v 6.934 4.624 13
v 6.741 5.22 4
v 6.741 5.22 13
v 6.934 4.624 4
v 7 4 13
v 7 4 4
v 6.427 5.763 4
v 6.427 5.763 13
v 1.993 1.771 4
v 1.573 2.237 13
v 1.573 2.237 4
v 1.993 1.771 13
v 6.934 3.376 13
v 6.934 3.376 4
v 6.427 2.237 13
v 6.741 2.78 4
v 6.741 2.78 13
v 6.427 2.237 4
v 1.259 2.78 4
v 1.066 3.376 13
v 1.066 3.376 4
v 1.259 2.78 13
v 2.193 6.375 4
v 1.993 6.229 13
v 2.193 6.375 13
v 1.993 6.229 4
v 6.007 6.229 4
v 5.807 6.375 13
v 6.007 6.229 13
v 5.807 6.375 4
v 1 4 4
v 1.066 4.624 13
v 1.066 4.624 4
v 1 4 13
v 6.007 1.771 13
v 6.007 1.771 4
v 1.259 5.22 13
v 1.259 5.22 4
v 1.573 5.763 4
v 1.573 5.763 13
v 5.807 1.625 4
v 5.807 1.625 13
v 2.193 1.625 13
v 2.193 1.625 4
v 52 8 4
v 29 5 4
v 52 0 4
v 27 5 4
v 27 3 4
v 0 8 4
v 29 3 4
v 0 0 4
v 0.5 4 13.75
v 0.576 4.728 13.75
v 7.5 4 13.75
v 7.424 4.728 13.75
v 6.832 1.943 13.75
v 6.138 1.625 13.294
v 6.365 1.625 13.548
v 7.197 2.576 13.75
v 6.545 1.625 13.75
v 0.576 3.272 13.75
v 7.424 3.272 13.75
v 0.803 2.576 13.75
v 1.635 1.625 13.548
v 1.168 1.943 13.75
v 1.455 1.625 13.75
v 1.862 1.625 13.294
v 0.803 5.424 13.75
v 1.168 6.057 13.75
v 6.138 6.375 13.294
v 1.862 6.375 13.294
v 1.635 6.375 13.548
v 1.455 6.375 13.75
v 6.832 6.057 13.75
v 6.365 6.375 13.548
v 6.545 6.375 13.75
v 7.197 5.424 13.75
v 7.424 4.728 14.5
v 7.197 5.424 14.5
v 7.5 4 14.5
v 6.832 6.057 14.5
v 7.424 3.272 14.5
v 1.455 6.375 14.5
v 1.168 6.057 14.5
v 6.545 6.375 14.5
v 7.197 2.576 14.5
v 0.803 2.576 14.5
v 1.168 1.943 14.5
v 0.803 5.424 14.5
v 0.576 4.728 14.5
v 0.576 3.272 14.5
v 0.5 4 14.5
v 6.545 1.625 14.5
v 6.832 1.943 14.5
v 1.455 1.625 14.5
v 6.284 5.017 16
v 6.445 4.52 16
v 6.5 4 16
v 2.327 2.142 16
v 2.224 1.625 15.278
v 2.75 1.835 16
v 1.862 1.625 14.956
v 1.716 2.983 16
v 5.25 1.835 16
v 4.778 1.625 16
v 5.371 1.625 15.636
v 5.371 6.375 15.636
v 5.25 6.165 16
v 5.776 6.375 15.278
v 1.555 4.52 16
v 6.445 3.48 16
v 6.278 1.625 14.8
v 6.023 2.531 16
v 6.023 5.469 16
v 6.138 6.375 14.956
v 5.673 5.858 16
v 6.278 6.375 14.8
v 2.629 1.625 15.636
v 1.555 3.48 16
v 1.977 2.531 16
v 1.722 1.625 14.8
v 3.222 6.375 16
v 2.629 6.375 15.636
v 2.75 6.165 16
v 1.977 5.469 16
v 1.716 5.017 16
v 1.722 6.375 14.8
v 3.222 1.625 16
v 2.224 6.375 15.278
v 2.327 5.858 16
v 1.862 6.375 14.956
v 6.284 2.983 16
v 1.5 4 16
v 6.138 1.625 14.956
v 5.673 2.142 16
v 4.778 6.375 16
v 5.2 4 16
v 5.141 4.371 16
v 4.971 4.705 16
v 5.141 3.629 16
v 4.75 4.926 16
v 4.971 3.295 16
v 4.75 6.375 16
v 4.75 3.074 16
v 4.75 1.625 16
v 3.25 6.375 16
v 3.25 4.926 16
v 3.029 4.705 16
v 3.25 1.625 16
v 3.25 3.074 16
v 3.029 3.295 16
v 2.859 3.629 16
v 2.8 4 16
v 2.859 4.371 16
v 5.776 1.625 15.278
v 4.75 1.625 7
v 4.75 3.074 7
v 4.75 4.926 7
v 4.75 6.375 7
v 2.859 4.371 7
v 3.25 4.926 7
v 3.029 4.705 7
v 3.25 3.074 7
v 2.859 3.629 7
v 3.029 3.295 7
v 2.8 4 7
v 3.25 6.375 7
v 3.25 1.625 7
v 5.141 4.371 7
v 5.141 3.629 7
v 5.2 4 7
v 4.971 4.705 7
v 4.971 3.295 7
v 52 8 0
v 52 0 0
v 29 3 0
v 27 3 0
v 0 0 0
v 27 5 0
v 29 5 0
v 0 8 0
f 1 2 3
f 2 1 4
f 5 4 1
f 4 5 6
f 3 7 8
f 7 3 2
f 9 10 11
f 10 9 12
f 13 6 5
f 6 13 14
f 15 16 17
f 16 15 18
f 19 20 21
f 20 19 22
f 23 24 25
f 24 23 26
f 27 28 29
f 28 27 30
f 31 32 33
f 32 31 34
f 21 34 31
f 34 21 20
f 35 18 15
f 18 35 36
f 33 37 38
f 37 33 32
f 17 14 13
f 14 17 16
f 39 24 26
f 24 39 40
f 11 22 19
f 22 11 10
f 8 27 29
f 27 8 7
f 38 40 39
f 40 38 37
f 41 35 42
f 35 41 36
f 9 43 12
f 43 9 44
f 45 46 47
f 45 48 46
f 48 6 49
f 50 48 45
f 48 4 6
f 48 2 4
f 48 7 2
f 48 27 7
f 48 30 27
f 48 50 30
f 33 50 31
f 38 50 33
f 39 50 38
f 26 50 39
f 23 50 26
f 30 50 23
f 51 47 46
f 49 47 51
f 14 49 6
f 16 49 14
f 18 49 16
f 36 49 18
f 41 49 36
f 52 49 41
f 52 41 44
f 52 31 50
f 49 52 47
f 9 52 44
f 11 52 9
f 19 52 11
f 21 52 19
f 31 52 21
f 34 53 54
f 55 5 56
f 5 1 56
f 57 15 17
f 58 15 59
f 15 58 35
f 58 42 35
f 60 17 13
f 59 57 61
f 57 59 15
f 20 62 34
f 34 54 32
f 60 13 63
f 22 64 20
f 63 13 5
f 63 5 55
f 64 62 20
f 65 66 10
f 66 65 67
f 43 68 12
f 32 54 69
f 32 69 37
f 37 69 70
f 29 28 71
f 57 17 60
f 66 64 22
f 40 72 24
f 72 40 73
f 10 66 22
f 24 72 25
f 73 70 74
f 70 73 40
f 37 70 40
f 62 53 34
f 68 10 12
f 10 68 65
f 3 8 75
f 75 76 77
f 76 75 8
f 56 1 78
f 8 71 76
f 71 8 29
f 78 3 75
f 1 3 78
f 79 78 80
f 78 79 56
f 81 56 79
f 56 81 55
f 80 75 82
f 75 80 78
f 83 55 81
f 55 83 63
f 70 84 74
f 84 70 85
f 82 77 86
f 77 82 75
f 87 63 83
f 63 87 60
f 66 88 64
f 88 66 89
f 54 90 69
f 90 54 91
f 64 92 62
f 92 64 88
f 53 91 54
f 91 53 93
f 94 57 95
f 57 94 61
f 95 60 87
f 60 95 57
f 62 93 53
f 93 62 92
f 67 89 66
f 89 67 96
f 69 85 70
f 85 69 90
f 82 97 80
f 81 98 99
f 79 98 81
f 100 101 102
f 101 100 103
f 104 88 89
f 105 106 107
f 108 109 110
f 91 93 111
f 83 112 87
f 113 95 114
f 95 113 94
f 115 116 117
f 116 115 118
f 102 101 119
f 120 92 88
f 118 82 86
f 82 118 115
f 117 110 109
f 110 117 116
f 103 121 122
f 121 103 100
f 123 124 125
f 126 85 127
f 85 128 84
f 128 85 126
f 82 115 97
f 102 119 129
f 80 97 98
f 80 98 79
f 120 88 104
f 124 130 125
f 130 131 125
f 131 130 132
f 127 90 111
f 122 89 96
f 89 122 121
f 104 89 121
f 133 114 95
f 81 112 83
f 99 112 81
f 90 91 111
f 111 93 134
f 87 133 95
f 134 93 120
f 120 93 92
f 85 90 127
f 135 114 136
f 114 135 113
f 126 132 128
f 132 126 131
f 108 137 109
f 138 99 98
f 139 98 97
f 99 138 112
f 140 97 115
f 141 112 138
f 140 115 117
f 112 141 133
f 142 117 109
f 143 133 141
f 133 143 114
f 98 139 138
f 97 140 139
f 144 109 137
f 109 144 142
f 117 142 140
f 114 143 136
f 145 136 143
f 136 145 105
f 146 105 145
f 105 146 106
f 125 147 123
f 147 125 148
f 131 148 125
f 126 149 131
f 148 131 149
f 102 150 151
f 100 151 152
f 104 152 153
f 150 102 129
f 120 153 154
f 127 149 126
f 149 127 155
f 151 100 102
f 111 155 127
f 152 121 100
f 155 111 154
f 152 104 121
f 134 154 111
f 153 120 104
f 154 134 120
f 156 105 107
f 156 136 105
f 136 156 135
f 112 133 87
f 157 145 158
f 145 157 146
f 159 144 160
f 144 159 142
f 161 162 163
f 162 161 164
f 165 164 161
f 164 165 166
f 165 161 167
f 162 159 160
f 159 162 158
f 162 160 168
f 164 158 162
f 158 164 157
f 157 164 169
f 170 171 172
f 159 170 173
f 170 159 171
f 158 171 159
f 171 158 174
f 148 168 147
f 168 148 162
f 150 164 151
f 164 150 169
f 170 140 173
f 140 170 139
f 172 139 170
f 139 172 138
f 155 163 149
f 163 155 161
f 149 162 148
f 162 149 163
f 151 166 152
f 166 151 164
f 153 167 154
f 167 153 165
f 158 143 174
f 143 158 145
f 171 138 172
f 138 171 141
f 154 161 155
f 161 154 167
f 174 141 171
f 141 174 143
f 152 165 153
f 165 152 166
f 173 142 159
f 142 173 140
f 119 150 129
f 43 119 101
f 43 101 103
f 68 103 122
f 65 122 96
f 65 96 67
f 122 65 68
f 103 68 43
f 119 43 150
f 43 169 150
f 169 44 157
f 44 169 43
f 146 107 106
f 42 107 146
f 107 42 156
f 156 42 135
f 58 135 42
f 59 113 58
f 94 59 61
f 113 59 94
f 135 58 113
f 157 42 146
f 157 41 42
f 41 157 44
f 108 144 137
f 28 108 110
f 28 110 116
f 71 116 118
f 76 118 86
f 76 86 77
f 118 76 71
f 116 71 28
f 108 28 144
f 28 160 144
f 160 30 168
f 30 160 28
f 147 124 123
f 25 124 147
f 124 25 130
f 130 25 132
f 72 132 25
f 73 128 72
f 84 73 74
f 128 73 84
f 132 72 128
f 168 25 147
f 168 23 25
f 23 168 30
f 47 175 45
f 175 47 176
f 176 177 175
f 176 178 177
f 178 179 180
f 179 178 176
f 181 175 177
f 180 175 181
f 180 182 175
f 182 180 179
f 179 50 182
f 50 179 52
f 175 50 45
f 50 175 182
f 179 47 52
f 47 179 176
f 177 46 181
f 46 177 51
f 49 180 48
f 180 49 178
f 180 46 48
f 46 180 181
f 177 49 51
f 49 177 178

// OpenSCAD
// Pin Connectors V2
// Tony Buser <tbuser@gmail.com>
// From http://www.thingiverse.com/thing:10541

// pinhole(h=5);

tolerance=0.3;

translate([4, 4, 4]) pin(r=3, h=12, t=tolerance, tight=false);
difference() {
cube([52, 8, 4]);
translate([27, 3, 0]) cube([2, 2, 4]);
}

// test();
// pintack(h=10);
// pinpeg(h=20);

module test() {
  tolerance = 0.3;
  
  translate([-12, 12, 0]) pinpeg(h=20);
  translate([12, 12, 0]) pintack(h=10);
  
  difference() {
    union() {
      translate([0, -12, 2.5]) cube(size = [59, 20, 5], center = true);
      translate([24, -12, 7.5]) cube(size = [12, 20, 15], center = true);
    }
    translate([-24, -12, 0]) pinhole(h=5, t=tolerance);
    translate([-12, -12, 0]) pinhole(h=5, t=tolerance, tight=false);
    translate([0, -12, 0]) pinhole(h=10, t=tolerance);
    translate([12, -12, 0]) pinhole(h=10, t=tolerance, tight=false);
    translate([24, -12, 15]) rotate([0, 180, 0]) pinhole(h=10, t=tolerance);
  }
}

module pinhole(h=10, r=4, lh=3, lt=1, t=0.3, tight=true) {
  // h = shaft height
  // r = shaft radius
  // lh = lip height
  // lt = lip thickness
  // t = tolerance
  // tight = set to false if you want a joint that spins easily
  
  union() {
    pin_solid(h, r+(t/2), lh, lt);
    cylinder(h=h+0.2, r=r);
    // widen the cylinder slightly
    // cylinder(h=h+0.2, r=r+(t-0.2/2));
    if (tight == false) {
      cylinder(h=h+0.2, r=r+(t/2)+0.25);
    }
    // widen the entrance hole to make insertion easier
    translate([0, 0, -0.1]) cylinder(h=lh/3, r2=r, r1=r+(t/2)+(lt/2));
  }
}

module pin(h=10, r=4, lh=3, lt=1, side=false) {
  // h = shaft height
  // r = shaft radius
  // lh = lip height
  // lt = lip thickness
  // side = set to true if you want it printed horizontally

  if (side) {
    pin_horizontal(h, r, lh, lt);
  } else {
    pin_vertical(h, r, lh, lt);
  }
}

module pintack(h=10, r=4, lh=3, lt=1, bh=3, br=8.75) {
  // bh = base_height
  // br = base_radius
  
  union() {
    cylinder(h=bh, r=br);
    translate([0, 0, bh]) pin(h, r, lh, lt);
  }
}

module pinpeg(h=20, r=4, lh=3, lt=1) {
  union() {
    translate([0, -h/4+0.05, 0]) pin(h/2+0.1, r, lh, lt, side=true);
    translate([0, h/4-0.05, 0]) rotate([0, 0, 180]) pin(h/2+0.1, r, lh, lt, side=true);
  }
}

// just call pin instead, I made this module because it was easier to do the rotation option this way
// since openscad complains of recursion if I did it all in one module
module pin_vertical(h=10, r=4, lh=3, lt=1) {
  // h = shaft height
  // r = shaft radius
  // lh = lip height
  // lt = lip thickness

  difference() {
    pin_solid(h, r, lh, lt);
    
    // center cut
    translate([-r*0.5/2, -(r*2+lt*2)/2, h/4]) cube([r*0.5, r*2+lt*2, h]);
    translate([0, 0, h/4]) cylinder(h=h+lh, r=r/2.5, $fn=20);
    // center curve
    // translate([0, 0, h/4]) rotate([90, 0, 0]) cylinder(h=r*2, r=r*0.5/2, center=true, $fn=20);
  
    // side cuts
    translate([-r*2, -lt-r*1.125, -1]) cube([r*4, lt*2, h+2]);
    translate([-r*2, -lt+r*1.125, -1]) cube([r*4, lt*2, h+2]);
  }
}

// call pin with side=true instead of this
module pin_horizontal(h=10, r=4, lh=3, lt=1) {
  // h = shaft height
  // r = shaft radius
  // lh = lip height
  // lt = lip thickness
  translate([0, h/2, r*1.125-lt]) rotate([90, 0, 0]) pin_vertical(h, r, lh, lt);
}

// this is mainly to make the pinhole module easier
module pin_solid(h=10, r=4, lh=3, lt=1) {
  union() {
    // shaft
    cylinder(h=h-lh, r=r, $fn=30);
    // lip
    // translate([0, 0, h-lh]) cylinder(h=lh*0.25, r1=r, r2=r+(lt/2), $fn=30);
    // translate([0, 0, h-lh+lh*0.25]) cylinder(h=lh*0.25, r2=r, r1=r+(lt/2), $fn=30);
    // translate([0, 0, h-lh+lh*0.50]) cylinder(h=lh*0.50, r1=r, r2=r-(lt/2), $fn=30);

    // translate([0, 0, h-lh]) cylinder(h=lh*0.50, r1=r, r2=r+(lt/2), $fn=30);
    // translate([0, 0, h-lh+lh*0.50]) cylinder(h=lh*0.50, r1=r+(lt/2), r2=r-(lt/3), $fn=30);    

    translate([0, 0, h-lh]) cylinder(h=lh*0.25, r1=r, r2=r+(lt/2), $fn=30);
    translate([0, 0, h-lh+lh*0.25]) cylinder(h=lh*0.25, r=r+(lt/2), $fn=30);    
    translate([0, 0, h-lh+lh*0.50]) cylinder(h=lh*0.50, r1=r+(lt/2), r2=r-(lt/2), $fn=30);    

    // translate([0, 0, h-lh]) cylinder(h=lh, r1=r+(lt/2), r2=1, $fn=30);
    // translate([0, 0, h-lh-lt/2]) cylinder(h=lt/2, r1=r, r2=r+(lt/2), $fn=30);
  }
}
